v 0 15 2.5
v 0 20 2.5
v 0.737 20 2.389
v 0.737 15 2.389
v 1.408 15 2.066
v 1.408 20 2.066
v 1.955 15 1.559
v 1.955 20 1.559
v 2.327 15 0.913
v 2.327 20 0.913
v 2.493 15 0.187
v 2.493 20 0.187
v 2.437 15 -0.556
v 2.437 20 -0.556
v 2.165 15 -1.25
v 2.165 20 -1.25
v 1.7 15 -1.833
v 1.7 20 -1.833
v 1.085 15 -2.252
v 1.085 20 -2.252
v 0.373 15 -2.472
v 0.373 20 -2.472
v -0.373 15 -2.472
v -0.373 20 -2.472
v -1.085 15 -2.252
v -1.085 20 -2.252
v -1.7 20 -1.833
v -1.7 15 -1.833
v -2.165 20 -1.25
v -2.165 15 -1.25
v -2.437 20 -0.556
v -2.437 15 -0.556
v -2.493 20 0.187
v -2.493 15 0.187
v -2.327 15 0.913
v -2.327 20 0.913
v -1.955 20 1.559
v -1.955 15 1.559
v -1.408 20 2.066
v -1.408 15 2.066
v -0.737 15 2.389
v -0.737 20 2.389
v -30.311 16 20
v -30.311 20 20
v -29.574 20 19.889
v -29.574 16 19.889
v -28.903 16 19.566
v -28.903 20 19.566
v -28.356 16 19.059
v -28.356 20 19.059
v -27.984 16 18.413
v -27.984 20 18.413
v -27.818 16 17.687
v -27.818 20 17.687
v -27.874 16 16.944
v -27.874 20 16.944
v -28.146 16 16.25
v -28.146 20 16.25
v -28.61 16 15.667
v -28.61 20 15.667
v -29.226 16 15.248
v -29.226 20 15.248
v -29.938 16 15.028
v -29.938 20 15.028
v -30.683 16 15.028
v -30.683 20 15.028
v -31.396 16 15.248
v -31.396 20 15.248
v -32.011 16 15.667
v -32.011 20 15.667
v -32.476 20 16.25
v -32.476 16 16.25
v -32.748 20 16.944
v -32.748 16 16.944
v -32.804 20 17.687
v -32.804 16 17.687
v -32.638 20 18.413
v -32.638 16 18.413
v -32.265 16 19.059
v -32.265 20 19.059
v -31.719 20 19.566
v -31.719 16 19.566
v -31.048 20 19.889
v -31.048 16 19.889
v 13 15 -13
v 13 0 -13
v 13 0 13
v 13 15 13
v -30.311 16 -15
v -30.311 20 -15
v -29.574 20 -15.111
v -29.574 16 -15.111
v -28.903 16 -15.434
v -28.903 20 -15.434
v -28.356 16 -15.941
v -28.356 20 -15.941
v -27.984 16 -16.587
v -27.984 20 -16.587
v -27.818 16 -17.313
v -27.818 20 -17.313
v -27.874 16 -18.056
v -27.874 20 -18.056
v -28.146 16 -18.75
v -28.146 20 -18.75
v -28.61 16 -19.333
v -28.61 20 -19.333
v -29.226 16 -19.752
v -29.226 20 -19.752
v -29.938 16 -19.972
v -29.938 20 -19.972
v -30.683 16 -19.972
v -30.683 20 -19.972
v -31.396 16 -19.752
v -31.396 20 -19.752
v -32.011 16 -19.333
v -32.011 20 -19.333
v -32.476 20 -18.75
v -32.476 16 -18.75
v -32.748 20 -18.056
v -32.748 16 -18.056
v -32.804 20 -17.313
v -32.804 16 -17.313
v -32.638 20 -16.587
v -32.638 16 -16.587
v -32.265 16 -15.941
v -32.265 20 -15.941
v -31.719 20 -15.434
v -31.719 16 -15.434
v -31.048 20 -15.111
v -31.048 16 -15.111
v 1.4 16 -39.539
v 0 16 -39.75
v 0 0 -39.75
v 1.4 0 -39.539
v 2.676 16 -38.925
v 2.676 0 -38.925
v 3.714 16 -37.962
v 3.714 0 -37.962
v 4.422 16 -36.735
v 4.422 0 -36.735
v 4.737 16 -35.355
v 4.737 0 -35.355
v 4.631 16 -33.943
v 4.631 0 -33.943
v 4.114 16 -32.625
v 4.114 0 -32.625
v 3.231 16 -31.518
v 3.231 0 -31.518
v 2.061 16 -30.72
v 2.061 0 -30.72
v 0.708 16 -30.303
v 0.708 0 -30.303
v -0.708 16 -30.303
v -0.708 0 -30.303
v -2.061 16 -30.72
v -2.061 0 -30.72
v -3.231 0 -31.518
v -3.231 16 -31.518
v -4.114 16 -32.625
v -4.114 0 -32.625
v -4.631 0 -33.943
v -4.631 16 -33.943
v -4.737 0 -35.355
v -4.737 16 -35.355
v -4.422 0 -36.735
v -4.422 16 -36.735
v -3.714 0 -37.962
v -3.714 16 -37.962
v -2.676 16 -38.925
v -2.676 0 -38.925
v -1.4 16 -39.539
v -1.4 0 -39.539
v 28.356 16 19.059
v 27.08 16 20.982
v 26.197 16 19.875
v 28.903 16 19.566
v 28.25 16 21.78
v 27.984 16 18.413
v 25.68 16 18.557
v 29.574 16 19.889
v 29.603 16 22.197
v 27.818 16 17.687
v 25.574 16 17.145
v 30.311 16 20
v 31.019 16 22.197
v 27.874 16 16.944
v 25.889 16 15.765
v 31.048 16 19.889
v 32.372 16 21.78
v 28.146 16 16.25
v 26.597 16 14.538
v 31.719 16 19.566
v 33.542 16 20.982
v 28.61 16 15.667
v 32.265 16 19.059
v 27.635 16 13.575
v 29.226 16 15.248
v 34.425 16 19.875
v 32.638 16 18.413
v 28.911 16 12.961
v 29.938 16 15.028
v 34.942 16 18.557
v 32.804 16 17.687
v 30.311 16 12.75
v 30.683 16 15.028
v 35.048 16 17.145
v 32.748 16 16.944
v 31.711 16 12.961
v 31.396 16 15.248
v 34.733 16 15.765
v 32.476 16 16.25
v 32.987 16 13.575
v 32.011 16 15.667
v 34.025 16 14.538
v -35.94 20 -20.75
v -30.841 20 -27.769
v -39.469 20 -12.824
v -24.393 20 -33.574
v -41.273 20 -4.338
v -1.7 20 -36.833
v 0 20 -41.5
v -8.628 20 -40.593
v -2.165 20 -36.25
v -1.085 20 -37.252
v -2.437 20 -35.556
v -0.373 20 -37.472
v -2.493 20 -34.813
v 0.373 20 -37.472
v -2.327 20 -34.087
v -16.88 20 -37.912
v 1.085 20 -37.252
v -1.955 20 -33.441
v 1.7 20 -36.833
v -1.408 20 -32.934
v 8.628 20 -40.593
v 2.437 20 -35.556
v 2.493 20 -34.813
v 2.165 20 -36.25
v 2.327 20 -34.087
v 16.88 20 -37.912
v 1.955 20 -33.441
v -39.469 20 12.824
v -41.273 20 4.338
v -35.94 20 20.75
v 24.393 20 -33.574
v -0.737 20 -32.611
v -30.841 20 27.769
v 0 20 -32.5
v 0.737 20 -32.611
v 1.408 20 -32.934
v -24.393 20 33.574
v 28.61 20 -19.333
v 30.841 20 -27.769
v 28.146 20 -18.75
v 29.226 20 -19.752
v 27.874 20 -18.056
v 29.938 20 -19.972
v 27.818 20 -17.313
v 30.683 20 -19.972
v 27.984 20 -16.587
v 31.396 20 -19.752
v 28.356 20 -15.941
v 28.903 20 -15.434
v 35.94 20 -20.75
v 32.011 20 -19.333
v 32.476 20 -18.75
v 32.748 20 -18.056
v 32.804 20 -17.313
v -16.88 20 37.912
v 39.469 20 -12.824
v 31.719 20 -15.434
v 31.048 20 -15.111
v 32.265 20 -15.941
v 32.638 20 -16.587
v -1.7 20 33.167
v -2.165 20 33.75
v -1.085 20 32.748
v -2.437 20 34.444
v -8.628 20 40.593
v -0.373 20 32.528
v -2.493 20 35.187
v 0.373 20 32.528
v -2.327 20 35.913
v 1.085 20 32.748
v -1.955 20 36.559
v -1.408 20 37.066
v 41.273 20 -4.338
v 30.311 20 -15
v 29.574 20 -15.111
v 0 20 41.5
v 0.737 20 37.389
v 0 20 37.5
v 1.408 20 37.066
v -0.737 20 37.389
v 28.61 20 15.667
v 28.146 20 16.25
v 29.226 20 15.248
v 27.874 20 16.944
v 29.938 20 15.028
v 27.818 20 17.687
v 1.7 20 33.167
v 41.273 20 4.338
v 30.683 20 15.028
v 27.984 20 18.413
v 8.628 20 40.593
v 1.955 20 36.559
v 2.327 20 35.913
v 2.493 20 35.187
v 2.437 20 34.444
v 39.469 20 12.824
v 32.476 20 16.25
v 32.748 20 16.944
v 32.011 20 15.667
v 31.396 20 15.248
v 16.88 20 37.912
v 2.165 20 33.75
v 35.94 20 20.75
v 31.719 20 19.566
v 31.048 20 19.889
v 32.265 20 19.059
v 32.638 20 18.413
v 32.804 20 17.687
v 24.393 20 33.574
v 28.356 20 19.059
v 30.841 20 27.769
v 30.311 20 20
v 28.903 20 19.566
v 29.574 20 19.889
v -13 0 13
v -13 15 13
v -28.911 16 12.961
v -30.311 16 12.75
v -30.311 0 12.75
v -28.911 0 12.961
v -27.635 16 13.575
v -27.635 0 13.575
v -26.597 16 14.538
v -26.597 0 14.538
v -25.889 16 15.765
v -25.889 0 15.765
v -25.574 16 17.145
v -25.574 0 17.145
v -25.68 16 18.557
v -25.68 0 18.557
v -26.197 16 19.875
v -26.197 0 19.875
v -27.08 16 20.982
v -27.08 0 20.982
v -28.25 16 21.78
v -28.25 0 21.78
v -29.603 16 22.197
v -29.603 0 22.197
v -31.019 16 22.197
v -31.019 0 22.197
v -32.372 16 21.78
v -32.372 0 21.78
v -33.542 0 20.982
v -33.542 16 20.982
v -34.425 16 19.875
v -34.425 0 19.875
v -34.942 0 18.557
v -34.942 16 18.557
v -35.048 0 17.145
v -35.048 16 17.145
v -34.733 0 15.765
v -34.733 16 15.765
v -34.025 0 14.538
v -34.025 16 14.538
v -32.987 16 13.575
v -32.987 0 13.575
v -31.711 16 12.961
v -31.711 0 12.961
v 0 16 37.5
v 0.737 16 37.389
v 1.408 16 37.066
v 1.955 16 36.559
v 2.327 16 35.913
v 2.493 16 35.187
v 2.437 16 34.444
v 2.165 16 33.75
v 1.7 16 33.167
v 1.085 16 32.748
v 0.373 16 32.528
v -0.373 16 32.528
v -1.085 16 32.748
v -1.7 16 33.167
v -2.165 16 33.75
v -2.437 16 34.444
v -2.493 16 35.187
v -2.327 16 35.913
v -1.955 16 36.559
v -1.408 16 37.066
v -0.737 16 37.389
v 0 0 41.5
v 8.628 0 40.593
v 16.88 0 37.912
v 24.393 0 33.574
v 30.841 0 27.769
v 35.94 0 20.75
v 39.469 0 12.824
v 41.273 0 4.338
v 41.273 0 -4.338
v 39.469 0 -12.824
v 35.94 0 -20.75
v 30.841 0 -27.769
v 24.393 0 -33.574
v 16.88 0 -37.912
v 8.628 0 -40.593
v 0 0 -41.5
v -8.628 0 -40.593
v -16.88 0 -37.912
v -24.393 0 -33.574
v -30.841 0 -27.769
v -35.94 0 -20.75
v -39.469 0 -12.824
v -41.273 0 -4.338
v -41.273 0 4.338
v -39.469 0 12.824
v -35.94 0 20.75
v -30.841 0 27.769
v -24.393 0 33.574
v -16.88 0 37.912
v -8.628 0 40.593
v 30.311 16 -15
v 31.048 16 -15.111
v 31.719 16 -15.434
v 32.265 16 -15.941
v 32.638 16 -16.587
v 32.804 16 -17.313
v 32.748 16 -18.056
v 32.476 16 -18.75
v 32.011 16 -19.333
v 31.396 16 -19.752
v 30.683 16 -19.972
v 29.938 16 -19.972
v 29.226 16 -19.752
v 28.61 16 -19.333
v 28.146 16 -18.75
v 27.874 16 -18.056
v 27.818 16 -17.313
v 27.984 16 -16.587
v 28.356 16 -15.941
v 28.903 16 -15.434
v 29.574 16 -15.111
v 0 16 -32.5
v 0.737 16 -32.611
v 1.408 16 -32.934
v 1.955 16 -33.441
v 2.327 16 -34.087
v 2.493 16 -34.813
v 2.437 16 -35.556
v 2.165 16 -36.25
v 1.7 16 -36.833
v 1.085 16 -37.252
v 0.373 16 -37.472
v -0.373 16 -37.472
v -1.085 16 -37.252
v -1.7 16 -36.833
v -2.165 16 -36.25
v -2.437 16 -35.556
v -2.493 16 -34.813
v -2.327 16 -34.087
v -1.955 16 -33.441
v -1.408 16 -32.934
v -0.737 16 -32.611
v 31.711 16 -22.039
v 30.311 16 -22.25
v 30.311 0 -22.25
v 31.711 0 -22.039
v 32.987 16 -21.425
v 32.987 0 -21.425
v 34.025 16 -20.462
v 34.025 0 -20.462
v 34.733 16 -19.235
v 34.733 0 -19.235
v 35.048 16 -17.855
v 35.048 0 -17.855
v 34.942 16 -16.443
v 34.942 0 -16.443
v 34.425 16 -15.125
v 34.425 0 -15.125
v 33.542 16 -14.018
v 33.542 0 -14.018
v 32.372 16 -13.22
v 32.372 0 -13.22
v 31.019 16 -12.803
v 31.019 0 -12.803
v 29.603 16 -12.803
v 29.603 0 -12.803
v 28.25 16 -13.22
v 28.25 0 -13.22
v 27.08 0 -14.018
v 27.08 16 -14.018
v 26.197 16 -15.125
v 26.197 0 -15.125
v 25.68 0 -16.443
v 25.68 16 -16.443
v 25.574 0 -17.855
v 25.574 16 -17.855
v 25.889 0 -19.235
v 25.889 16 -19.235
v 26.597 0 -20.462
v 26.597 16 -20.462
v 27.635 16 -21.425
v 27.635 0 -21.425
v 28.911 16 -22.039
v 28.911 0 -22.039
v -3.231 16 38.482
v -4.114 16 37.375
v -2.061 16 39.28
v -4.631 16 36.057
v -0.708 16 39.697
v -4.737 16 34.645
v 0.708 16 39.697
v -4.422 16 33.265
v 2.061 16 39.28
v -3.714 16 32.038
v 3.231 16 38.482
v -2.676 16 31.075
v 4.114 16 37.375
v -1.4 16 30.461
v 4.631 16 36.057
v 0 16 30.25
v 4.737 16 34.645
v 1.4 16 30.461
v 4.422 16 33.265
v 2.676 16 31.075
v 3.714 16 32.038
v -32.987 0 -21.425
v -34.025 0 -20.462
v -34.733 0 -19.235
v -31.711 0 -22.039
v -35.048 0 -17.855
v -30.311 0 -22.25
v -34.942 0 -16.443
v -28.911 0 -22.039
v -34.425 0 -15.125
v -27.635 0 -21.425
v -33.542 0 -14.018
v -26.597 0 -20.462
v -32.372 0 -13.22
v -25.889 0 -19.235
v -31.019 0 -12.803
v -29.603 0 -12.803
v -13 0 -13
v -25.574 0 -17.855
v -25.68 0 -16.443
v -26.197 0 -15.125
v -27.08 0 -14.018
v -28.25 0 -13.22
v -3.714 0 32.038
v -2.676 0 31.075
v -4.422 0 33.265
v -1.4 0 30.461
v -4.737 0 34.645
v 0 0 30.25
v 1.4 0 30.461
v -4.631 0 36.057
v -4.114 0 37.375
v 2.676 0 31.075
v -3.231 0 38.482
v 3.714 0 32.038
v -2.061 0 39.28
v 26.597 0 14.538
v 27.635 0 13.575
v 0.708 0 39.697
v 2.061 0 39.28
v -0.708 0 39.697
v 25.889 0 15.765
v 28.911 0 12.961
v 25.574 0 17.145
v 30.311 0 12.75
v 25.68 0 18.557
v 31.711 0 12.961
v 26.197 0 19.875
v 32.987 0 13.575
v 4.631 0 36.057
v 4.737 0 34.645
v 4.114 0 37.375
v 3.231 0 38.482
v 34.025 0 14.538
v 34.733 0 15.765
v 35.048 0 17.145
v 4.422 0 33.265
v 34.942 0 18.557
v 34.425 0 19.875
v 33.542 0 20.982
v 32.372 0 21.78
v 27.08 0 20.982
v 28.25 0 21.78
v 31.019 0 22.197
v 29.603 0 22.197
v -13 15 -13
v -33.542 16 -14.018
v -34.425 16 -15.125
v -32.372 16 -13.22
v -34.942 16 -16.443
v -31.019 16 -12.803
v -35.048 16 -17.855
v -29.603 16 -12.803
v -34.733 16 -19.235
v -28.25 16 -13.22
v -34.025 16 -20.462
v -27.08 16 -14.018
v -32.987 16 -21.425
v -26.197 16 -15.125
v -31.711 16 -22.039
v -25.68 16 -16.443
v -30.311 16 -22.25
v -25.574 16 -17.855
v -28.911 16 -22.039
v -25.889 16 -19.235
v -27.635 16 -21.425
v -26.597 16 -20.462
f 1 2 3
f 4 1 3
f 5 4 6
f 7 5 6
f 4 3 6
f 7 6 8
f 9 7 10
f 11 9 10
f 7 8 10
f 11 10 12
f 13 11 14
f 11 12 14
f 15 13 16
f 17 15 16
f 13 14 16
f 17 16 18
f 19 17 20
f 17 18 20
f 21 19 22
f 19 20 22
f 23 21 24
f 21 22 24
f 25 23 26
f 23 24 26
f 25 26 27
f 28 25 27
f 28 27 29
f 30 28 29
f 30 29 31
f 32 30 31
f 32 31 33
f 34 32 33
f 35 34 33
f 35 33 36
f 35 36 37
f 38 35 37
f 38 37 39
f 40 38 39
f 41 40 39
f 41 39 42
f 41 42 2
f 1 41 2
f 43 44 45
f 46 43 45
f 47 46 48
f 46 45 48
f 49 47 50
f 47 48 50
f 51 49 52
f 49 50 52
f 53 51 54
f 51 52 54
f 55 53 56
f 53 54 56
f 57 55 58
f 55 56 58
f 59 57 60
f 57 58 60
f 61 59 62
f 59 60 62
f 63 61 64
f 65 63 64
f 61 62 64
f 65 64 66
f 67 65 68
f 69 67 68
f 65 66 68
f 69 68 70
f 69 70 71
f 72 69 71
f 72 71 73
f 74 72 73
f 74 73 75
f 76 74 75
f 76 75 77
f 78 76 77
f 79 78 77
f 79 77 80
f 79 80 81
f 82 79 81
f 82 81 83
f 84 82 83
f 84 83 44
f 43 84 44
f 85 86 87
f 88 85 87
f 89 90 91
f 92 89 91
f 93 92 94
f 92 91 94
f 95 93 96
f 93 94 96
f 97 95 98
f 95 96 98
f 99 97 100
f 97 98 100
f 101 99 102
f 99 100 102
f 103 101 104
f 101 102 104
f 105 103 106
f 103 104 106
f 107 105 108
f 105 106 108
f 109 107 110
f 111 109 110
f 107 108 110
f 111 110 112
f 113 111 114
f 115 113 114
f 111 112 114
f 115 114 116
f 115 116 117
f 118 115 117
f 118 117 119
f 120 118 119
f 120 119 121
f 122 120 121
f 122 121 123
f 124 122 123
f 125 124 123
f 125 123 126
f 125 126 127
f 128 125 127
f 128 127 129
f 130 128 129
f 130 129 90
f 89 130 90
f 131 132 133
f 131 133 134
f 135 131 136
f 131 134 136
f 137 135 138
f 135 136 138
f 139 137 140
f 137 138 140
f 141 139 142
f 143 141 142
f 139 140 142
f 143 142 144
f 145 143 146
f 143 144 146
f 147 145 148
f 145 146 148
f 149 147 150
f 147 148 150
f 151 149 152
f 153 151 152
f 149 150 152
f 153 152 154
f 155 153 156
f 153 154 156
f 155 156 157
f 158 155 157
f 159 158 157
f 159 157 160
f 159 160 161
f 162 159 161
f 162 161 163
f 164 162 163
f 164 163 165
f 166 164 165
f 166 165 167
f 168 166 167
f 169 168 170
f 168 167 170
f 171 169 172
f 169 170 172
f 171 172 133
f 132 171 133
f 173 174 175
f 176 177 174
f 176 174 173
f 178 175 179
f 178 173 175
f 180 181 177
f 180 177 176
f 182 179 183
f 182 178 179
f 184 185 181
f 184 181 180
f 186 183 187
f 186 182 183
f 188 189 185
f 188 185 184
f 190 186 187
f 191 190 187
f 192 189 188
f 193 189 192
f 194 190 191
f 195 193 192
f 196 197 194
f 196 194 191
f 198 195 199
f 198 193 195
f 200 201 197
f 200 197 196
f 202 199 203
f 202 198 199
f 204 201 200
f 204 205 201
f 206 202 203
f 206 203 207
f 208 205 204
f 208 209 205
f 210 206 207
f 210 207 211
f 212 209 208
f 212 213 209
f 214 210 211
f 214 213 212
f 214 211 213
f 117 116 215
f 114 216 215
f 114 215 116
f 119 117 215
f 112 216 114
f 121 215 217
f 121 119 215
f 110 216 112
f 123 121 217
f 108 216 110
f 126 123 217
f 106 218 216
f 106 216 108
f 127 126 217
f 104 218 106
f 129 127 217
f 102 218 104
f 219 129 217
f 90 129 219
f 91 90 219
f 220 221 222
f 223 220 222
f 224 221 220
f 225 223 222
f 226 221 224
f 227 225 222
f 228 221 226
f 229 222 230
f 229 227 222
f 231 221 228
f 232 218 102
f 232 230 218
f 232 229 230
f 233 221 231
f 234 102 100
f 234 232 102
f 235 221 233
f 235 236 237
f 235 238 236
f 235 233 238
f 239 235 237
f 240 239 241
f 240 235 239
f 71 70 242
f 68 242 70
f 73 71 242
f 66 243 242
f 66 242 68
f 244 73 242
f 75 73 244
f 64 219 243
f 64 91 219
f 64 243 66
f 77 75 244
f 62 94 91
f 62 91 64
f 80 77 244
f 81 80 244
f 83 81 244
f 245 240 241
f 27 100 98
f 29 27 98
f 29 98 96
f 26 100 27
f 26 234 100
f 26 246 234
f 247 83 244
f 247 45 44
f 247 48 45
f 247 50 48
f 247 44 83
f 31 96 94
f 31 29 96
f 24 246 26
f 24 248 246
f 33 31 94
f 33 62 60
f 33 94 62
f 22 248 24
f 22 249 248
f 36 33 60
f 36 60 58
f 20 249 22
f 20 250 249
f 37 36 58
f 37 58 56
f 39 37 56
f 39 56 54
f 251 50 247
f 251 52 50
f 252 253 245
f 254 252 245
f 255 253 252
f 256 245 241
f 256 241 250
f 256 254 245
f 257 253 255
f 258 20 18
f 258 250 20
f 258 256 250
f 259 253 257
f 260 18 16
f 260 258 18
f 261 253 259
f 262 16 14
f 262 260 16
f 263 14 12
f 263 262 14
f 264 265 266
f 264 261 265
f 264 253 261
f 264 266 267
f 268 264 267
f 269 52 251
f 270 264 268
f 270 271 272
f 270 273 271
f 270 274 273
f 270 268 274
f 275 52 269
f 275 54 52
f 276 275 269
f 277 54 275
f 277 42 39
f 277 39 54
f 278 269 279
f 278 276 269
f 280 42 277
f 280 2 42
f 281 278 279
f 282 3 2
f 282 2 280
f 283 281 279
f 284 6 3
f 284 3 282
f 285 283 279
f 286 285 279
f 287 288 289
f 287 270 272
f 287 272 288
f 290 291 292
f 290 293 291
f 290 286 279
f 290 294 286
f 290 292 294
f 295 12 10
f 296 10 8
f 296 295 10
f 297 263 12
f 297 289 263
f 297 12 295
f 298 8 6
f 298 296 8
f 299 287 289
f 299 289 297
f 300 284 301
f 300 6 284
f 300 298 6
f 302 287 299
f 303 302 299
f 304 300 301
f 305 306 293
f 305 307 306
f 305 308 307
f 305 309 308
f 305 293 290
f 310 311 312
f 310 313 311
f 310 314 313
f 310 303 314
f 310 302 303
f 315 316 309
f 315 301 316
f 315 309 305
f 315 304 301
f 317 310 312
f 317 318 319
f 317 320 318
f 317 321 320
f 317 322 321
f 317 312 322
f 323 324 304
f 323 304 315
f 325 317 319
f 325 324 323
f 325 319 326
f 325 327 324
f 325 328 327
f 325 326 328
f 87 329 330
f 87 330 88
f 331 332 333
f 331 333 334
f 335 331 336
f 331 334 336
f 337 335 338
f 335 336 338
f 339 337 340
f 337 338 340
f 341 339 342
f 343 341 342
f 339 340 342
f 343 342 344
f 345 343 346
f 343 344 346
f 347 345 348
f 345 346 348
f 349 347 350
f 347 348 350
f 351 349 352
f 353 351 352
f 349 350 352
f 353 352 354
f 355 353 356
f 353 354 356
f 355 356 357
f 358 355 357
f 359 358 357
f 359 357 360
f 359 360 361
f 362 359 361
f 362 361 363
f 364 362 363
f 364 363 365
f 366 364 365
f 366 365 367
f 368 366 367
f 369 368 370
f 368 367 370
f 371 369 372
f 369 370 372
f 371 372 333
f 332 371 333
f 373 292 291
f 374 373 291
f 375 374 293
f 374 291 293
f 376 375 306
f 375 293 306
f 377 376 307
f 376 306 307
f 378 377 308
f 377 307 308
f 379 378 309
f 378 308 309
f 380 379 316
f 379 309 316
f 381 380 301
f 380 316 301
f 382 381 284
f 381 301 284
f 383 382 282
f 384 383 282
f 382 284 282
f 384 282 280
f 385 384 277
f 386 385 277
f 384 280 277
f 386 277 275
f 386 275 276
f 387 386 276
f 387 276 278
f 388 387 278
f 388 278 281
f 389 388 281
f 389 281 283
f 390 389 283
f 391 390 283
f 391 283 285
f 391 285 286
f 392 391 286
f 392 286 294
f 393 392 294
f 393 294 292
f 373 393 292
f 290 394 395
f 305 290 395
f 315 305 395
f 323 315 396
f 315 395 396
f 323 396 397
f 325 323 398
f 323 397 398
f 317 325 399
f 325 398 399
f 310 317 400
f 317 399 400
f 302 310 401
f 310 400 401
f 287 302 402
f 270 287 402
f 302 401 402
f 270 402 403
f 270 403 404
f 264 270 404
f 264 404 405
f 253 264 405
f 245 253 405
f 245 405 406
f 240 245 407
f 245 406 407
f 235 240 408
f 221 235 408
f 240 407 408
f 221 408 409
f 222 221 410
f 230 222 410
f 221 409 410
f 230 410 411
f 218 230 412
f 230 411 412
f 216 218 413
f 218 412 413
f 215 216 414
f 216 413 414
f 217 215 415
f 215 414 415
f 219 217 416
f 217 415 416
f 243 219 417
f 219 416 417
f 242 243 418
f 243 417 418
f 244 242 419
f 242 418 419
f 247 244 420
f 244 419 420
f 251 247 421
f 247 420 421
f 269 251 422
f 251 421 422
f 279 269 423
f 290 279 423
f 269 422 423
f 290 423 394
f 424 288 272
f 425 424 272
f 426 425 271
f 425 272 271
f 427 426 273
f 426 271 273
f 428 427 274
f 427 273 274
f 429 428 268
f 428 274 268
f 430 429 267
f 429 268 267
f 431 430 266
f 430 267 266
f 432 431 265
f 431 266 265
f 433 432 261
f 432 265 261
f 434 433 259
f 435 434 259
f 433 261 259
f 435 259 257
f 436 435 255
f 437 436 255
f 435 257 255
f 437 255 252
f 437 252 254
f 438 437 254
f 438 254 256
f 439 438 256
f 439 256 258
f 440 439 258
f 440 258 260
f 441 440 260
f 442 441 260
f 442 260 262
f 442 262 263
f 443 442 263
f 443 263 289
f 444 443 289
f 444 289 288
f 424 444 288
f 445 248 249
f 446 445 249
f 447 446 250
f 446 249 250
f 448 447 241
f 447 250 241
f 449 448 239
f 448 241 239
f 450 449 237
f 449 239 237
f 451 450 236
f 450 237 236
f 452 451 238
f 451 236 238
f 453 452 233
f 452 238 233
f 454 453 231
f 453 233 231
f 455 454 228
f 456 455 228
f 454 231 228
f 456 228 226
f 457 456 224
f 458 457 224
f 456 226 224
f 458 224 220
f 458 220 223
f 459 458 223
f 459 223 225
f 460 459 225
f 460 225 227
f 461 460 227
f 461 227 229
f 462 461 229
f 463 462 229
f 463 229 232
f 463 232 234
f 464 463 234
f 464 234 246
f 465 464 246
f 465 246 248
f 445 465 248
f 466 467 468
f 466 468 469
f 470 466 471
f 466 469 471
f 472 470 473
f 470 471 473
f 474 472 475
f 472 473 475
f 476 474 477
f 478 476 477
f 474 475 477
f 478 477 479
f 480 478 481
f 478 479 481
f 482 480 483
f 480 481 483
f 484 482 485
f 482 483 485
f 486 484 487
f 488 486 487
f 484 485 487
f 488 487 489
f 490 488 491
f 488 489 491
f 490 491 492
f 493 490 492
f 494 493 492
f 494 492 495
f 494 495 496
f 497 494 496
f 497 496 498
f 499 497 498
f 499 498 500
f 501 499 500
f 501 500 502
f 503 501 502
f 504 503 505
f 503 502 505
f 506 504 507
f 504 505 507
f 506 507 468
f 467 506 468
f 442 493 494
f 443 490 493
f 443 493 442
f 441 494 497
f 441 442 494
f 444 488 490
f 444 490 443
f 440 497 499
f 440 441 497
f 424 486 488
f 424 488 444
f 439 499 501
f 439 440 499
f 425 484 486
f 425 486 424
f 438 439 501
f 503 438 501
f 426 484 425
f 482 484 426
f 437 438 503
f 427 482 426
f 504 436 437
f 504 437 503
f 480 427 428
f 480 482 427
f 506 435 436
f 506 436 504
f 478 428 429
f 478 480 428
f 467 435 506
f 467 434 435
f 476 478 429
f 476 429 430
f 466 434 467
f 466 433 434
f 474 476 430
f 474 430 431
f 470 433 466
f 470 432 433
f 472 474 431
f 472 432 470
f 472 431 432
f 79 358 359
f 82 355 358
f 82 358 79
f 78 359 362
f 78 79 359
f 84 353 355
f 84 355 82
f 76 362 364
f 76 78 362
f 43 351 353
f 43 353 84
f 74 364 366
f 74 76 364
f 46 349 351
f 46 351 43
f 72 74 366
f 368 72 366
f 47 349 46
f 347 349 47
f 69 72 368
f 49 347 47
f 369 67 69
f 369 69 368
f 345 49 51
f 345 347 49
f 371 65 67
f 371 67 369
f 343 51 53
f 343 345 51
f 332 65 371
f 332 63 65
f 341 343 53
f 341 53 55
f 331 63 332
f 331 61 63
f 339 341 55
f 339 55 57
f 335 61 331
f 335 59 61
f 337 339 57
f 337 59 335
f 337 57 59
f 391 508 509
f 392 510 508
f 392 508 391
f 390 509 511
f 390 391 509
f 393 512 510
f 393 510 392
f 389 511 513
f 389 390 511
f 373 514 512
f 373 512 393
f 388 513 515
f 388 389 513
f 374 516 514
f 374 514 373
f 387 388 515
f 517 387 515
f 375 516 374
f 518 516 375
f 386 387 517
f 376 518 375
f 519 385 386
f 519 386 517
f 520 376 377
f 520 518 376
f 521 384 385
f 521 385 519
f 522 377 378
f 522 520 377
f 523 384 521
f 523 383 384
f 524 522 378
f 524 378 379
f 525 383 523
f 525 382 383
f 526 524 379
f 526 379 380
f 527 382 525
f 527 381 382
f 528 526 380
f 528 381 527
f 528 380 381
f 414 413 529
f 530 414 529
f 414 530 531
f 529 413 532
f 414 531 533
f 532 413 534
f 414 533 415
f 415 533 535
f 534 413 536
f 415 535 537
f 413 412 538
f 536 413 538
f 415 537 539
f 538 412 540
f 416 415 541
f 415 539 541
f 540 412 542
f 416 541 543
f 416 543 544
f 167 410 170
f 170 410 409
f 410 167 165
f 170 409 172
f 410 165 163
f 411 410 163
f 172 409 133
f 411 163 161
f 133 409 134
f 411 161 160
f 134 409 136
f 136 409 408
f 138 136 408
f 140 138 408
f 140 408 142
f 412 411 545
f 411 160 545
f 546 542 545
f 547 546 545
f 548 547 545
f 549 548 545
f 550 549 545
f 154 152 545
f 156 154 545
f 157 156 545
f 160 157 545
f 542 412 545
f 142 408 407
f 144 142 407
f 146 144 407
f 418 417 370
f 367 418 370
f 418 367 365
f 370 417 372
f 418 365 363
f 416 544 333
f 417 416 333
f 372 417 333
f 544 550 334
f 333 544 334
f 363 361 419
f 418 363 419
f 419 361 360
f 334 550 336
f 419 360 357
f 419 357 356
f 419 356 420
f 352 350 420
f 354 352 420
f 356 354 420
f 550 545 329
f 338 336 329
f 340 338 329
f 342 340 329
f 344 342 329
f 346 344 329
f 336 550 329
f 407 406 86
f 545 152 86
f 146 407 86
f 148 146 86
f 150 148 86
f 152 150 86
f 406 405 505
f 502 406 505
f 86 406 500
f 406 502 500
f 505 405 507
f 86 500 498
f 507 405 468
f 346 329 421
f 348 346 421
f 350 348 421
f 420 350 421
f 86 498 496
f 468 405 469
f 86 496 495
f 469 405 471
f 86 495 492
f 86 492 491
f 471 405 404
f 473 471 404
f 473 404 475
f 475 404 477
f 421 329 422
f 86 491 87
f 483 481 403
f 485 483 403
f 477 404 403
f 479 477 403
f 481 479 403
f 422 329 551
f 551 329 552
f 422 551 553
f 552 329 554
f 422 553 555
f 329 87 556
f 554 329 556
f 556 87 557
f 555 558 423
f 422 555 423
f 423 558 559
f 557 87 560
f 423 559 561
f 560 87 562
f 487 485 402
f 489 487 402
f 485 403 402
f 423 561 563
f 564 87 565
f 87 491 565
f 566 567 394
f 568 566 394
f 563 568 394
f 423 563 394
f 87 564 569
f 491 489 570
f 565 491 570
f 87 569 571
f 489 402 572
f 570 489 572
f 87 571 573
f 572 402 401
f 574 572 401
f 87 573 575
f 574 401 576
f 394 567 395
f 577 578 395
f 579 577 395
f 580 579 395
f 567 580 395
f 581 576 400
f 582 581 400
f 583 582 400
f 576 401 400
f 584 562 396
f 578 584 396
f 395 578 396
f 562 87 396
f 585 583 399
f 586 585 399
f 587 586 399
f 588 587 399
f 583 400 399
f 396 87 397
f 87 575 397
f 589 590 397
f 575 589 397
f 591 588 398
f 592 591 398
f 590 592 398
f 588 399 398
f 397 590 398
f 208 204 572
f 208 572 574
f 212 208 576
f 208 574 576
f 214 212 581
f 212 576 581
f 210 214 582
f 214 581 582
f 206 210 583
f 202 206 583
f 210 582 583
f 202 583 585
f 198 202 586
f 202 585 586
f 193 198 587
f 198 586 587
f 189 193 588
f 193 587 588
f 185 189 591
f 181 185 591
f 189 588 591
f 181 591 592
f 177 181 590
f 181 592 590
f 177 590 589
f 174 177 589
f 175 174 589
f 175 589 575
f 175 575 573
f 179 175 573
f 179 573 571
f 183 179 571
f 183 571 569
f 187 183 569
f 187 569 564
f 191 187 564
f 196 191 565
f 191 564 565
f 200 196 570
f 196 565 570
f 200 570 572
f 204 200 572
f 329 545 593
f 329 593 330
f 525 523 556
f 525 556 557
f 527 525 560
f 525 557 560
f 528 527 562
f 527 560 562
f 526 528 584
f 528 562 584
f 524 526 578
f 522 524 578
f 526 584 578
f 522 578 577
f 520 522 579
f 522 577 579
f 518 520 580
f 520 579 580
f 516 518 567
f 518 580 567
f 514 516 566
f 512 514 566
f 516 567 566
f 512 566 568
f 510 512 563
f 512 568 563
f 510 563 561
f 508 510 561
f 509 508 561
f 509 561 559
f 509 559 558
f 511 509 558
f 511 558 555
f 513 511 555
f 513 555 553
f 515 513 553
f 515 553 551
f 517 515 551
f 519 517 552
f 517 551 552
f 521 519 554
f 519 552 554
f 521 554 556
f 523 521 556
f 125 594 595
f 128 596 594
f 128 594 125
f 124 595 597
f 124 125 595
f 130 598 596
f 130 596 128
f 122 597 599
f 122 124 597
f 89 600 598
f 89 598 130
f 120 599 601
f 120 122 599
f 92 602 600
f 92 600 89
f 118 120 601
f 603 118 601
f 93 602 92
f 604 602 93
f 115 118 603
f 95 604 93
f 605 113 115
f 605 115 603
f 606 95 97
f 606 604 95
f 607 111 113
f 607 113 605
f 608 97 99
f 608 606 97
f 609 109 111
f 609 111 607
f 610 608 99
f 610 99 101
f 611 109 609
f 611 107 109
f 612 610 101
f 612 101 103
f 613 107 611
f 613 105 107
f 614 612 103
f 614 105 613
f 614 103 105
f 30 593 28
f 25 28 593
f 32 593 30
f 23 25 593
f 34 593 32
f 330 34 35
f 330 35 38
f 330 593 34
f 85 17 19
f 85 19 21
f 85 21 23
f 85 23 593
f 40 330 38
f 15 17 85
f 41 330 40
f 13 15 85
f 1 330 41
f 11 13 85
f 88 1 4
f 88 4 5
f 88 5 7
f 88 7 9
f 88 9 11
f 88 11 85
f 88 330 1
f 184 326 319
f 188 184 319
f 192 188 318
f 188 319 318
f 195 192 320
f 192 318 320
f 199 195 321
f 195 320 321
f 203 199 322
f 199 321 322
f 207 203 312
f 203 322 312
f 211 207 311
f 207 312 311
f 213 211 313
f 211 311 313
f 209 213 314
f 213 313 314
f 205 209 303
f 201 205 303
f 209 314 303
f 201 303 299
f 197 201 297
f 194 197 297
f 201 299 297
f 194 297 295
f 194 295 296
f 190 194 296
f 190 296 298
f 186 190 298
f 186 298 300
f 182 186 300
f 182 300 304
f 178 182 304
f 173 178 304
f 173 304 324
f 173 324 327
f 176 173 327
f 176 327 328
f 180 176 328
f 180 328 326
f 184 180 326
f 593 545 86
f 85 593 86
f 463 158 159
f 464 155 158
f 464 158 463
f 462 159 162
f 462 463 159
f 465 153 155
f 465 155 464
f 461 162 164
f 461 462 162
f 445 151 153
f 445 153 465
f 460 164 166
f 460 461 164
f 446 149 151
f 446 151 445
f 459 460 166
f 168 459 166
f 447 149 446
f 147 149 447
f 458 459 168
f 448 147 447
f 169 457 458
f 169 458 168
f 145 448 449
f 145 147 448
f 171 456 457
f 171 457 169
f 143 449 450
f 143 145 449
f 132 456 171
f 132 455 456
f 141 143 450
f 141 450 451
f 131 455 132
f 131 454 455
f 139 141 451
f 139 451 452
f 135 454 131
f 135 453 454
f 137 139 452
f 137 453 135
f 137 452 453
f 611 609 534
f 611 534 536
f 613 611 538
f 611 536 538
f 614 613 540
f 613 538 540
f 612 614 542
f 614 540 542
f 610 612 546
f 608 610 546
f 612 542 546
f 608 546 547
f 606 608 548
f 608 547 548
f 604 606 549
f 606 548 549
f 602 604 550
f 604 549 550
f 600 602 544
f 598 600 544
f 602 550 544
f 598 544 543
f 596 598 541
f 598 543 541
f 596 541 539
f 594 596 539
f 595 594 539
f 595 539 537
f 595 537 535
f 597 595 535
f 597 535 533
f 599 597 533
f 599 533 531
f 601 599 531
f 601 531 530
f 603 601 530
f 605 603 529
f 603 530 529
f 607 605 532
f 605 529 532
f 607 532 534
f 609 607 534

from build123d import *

# Parameters (mm, degrees)
SKETCH1_R                     = 41.5
MAIN_PLATE_DEPTH              = 20
SKETCH3_R                     = 2.5
MOMO_SPARKO_DEPTH             = 63.004032127
SKETCH6_R                     = 4.75
MOMO_SPARKO_SCREW_HEADS_DEPTH = 16
SKETCH7_W                     = 26
SKETCH7_H                     = 26
CUT_EXTRUDE1_DEPTH            = 15
SKETCH8_R                     = 2.5
CUT_EXTRUDE2_DEPTH            = 63.004032127


with BuildPart() as part:
    # Sketch1 → Main Plate (new body)
    with BuildSketch(Plane(origin=(0, 0, 0), x_dir=(1, 0, 0), z_dir=(0, 1, 0))):
        with Locations(Location((0, 0, 0), (0, 0, 270))):
            Circle(SKETCH1_R)
    extrude(amount=MAIN_PLATE_DEPTH)

    # Sketch3 → Momo - Sparko (cut, through all)
    with BuildSketch(Plane(origin=(0, 20, 0), x_dir=(1, 0, 0), z_dir=(0, 1, 0))):
        with Locations(Location((0, 35, 0), (0, 0, 270))):
            Circle(SKETCH3_R)
        with Locations(Location((30.310889132, 17.5, 0), (0, 0, 270))):
            Circle(SKETCH3_R)
        with Locations(Location((30.310889132, -17.5, 0), (0, 0, 270))):
            Circle(SKETCH3_R)
        with Locations(Location((0, -35, 0), (0, 0, 270))):
            Circle(SKETCH3_R)
        with Locations(Location((-30.310889132, -17.5, 0), (0, 0, 270))):
            Circle(SKETCH3_R)
        with Locations(Location((-30.310889132, 17.5, 0), (0, 0, 270))):
            Circle(SKETCH3_R)
    extrude(amount=-MOMO_SPARKO_DEPTH, mode=Mode.SUBTRACT)

    # Sketch6 → Momo - Sparko Screw Heads (cut)
    with BuildSketch(Plane.XZ):
        with Locations(Location((0, 35, 0), (0, 0, 270))):
            Circle(SKETCH6_R)
        with Locations(Location((30.310889132, 17.5, 0), (0, 0, 270))):
            Circle(SKETCH6_R)
        with Locations(Location((30.310889132, -17.5, 0), (0, 0, 270))):
            Circle(SKETCH6_R)
        with Locations(Location((0, -35, 0), (0, 0, 270))):
            Circle(SKETCH6_R)
        with Locations(Location((-30.310889132, -17.5, 0), (0, 0, 270))):
            Circle(SKETCH6_R)
        with Locations(Location((-30.310889132, 17.5, 0), (0, 0, 270))):
            Circle(SKETCH6_R)
    extrude(amount=-MOMO_SPARKO_SCREW_HEADS_DEPTH, mode=Mode.SUBTRACT)

    # Sketch7 → Cut-Extrude1 (cut)
    with BuildSketch(Plane.XZ):
        Rectangle(SKETCH7_W, SKETCH7_H)
    extrude(amount=-CUT_EXTRUDE1_DEPTH, mode=Mode.SUBTRACT)

    # Sketch8 → Cut-Extrude2 (cut, through all)
    with BuildSketch(Plane(origin=(0, 20, 0), x_dir=(1, 0, 0), z_dir=(0, 1, 0))):
        with Locations(Location((0, 0, 0), (0, 0, 270))):
            Circle(SKETCH8_R)
    extrude(amount=-CUT_EXTRUDE2_DEPTH, mode=Mode.SUBTRACT)


solid = part.part
